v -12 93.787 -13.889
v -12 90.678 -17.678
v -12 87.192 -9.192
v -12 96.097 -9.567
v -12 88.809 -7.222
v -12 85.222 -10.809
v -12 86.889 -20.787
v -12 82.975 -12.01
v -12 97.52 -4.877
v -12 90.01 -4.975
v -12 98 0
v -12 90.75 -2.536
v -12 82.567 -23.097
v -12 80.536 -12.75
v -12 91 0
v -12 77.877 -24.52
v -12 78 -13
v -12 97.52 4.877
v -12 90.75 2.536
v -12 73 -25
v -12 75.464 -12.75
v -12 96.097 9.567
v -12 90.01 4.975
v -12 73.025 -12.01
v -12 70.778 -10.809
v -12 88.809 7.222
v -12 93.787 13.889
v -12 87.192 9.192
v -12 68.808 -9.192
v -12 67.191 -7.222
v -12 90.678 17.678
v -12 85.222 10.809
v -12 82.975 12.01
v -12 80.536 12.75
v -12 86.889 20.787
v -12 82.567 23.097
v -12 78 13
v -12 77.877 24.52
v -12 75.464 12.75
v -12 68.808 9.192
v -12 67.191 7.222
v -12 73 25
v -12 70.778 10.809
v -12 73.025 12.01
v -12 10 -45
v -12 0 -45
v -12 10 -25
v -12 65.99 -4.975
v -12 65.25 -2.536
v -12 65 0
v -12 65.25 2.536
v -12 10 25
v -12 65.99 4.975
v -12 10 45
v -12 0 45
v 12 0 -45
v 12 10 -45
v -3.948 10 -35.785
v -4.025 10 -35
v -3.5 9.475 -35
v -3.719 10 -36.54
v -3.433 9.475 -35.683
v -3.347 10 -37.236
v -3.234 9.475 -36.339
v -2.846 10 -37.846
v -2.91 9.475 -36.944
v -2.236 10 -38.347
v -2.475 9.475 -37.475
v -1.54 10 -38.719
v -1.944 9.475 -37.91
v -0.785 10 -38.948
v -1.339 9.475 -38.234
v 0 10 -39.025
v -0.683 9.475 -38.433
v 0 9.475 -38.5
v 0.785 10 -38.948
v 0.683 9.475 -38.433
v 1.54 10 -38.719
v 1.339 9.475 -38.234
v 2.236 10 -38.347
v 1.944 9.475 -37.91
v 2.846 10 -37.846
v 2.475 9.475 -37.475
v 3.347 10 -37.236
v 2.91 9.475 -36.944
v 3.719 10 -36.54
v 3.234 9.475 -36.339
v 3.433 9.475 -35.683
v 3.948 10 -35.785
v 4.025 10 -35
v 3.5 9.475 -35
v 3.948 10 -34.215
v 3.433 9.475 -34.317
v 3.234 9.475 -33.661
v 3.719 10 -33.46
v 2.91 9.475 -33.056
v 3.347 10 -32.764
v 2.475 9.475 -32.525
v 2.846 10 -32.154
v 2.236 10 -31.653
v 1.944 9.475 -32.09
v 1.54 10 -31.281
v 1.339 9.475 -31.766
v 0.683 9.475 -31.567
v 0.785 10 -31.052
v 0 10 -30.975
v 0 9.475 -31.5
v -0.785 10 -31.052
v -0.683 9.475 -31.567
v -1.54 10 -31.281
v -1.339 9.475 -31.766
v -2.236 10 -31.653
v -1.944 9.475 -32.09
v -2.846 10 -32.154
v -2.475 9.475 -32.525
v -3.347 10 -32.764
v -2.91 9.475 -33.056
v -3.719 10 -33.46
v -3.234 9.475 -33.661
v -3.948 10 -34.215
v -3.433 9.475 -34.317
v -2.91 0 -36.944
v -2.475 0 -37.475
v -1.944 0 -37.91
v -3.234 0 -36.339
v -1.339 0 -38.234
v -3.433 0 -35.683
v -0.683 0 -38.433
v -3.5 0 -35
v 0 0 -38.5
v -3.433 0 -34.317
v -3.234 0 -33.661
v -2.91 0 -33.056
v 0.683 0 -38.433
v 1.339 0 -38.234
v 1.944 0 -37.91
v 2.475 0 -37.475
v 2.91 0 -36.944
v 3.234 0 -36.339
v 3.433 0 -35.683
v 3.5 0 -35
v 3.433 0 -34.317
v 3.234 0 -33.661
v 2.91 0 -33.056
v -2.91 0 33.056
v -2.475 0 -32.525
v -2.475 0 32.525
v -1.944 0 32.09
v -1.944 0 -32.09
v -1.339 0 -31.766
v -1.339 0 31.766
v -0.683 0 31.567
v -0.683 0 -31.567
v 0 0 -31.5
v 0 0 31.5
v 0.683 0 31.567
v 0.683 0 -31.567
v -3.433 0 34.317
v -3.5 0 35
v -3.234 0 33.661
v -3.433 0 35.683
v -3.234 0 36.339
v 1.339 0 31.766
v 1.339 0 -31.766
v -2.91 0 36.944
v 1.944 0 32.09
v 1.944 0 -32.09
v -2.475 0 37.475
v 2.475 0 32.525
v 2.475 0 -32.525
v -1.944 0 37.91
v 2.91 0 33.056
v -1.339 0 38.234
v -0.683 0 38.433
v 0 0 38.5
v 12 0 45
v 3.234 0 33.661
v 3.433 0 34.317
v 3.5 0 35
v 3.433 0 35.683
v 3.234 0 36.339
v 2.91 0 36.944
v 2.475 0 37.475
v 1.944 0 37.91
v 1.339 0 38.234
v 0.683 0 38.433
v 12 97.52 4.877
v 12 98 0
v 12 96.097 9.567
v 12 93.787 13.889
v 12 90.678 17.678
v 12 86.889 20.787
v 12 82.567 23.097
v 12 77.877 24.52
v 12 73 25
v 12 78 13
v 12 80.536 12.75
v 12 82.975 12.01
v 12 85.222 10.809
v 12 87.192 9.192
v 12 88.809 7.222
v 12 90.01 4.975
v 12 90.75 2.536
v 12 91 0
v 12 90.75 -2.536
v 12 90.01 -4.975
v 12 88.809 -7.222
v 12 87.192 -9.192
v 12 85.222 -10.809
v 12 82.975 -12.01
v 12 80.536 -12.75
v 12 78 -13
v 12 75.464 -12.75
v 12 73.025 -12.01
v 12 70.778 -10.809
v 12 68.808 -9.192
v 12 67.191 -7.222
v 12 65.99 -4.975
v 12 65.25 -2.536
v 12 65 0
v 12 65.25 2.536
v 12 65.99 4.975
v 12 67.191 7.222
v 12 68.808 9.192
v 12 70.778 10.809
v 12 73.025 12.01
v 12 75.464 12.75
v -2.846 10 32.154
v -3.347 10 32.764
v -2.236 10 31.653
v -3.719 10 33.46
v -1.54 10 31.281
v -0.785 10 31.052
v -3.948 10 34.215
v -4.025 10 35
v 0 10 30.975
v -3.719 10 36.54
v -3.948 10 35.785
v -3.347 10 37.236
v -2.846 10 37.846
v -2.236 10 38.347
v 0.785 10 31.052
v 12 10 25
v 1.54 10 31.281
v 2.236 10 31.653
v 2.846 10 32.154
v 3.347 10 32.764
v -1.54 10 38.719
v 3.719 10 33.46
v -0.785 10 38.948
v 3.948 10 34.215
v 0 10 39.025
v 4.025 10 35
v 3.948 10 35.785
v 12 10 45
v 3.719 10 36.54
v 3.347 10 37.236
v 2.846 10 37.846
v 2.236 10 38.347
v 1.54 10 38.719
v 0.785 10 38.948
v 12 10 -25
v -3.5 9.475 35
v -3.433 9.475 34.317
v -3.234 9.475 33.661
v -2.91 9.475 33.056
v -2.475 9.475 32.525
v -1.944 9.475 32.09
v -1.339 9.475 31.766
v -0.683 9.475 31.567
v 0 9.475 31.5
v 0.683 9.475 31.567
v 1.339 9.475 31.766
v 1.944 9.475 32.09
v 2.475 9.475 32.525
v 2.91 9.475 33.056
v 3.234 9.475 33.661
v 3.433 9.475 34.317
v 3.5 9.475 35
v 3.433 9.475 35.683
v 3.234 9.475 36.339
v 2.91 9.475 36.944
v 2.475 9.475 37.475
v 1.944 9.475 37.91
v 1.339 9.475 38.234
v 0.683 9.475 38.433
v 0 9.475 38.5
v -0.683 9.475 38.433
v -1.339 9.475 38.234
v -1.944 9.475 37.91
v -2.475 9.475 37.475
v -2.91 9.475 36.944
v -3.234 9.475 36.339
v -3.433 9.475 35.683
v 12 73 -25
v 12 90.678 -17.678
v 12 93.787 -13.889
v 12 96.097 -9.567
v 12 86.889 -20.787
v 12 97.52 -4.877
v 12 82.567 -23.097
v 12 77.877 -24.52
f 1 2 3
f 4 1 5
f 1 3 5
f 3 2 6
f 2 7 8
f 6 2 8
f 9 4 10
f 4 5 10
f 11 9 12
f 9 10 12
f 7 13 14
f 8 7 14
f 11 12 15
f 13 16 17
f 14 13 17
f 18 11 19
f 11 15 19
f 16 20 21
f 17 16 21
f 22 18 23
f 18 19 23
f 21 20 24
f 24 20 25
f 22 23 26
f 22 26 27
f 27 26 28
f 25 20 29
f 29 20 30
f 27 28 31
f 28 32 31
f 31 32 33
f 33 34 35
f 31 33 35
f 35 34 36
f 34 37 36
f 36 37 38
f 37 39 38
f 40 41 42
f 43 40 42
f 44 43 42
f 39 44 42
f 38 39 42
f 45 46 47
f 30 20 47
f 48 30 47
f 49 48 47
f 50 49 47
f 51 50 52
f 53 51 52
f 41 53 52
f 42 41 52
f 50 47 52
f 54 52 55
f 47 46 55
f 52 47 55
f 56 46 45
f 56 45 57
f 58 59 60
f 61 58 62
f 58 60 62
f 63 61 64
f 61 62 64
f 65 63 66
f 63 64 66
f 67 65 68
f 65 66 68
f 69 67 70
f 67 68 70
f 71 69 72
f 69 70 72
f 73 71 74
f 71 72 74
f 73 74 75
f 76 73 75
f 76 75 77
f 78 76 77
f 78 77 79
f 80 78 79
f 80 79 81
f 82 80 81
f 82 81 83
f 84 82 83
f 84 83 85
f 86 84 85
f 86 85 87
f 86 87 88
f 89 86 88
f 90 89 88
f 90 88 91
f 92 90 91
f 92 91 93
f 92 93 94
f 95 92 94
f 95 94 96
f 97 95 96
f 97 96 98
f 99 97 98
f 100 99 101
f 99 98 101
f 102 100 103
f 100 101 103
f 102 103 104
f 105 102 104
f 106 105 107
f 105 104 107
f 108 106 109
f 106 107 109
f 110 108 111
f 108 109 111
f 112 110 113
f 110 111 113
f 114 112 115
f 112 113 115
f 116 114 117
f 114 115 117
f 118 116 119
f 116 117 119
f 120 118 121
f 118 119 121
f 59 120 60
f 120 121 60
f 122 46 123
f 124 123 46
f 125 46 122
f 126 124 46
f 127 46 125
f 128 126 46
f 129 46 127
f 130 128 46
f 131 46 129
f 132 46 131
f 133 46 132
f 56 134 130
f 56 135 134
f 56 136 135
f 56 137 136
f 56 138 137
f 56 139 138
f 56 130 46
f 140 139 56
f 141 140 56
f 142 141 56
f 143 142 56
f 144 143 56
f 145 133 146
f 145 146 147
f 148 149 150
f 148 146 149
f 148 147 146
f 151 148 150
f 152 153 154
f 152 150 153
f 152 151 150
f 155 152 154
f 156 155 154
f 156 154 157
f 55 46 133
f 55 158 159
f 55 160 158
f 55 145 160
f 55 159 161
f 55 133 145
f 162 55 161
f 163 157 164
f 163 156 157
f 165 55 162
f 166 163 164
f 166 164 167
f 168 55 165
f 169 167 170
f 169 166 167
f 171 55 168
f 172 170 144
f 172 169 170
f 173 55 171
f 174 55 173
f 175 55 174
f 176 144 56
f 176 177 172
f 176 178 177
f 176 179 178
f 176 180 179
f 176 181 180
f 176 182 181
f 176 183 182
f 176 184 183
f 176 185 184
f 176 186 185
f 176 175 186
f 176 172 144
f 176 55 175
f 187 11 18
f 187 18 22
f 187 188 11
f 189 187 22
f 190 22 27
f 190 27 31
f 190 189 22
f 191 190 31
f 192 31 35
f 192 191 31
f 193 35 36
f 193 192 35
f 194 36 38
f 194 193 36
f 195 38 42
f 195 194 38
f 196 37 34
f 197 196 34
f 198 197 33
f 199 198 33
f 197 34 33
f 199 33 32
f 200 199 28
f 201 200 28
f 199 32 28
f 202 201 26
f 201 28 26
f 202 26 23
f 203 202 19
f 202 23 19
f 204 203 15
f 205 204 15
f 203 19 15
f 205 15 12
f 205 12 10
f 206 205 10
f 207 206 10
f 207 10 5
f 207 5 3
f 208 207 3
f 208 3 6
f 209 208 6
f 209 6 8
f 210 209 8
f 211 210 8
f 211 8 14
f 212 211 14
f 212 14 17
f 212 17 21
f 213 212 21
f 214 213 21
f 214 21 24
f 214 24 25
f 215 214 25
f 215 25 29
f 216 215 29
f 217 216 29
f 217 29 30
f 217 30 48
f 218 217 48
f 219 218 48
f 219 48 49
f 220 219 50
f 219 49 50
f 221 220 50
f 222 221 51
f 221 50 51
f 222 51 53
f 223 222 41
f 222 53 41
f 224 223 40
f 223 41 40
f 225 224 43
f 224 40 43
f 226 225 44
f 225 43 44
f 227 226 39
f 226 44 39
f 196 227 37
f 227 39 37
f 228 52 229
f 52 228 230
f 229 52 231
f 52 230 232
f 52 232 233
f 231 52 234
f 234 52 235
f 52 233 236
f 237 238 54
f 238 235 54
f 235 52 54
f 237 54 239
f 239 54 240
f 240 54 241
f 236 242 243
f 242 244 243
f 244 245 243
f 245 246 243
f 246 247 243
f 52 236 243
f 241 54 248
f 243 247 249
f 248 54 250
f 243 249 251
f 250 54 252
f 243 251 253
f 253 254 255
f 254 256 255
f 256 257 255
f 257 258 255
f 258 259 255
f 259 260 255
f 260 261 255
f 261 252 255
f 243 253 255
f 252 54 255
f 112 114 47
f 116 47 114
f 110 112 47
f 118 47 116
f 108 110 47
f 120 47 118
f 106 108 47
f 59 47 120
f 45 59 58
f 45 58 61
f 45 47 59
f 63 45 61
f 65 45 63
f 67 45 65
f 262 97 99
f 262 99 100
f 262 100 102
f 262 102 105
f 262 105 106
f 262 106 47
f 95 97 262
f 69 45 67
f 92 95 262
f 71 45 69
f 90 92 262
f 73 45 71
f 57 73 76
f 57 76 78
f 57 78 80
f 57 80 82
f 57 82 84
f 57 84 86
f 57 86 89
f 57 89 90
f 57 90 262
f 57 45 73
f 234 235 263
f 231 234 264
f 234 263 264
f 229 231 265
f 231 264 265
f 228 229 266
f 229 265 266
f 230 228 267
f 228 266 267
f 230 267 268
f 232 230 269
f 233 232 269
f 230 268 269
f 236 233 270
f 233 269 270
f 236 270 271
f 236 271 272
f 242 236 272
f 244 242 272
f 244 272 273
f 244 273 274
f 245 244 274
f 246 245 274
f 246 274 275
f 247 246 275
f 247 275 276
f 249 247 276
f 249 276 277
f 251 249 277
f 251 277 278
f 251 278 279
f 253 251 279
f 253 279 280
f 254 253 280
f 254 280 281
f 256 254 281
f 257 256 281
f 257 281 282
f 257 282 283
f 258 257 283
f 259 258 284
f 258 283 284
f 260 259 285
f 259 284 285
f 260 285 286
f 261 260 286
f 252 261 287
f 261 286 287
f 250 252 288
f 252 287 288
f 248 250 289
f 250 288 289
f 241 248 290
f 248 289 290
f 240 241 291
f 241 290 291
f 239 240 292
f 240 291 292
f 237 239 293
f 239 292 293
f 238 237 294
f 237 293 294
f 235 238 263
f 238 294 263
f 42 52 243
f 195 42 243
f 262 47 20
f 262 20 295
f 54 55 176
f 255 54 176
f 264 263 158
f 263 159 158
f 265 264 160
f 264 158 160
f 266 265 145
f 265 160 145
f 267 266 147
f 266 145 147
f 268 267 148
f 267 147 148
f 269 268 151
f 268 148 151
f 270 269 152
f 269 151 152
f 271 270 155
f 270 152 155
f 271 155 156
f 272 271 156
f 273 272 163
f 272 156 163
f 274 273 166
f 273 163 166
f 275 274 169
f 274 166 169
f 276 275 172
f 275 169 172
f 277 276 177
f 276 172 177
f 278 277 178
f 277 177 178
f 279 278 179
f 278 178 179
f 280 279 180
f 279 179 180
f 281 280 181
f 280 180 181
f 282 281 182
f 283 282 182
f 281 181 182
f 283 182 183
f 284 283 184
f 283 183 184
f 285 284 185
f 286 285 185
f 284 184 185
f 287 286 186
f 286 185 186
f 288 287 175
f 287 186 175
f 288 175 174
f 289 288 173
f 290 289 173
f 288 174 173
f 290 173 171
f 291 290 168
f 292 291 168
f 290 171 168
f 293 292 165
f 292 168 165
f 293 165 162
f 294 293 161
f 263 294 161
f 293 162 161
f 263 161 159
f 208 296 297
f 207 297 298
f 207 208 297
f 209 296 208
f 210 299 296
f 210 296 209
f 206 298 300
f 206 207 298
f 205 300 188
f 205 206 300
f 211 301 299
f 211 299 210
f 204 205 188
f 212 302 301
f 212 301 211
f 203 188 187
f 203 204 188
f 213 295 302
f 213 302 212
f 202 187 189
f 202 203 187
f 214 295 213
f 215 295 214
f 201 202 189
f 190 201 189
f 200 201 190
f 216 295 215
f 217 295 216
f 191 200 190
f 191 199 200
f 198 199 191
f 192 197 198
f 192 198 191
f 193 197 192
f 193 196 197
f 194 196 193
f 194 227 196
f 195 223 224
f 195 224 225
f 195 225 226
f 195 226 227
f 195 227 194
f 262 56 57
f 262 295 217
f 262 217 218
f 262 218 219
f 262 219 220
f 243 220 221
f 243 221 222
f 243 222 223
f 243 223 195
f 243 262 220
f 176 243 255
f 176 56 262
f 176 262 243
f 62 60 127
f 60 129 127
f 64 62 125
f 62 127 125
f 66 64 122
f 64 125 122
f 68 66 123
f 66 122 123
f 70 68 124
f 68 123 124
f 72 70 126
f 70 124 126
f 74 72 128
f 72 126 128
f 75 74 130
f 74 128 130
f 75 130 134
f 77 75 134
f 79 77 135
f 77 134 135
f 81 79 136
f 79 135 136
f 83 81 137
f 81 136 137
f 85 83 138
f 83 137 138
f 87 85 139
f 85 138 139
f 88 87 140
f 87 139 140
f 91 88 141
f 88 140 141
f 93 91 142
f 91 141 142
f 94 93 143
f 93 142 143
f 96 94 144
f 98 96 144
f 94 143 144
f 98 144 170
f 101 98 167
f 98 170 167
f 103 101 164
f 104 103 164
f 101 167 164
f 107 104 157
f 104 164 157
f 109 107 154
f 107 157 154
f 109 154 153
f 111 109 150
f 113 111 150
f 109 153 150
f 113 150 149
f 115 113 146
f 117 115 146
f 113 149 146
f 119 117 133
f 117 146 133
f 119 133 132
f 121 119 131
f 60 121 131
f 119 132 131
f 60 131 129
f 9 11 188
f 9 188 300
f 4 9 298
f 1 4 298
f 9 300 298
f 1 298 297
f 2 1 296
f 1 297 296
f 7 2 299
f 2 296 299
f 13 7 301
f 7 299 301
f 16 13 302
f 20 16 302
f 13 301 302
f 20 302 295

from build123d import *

# Parameters (mm, degrees)
EXTRUDE_1_DEPTH      = 10
EXTRUDE_2_DEPTH      = 68
SKETCH_9_W           = 24
SKETCH_9_H           = 50
EXTRUDE_4_DEPTH      = 20
SKETCH_10_R          = 13
CUT_EXTRUDE_3_DEPTH  = 109.53570841
FILLET_6_R           = 25
SKETCH_22_W          = 24
SKETCH_22_H          = 5
EXTRUDE_5_DEPTH      = 10
M8X1_0_1_D           = 7
M8X1_0_1_CSINK_D     = 8.05
M8X1_0_1_CSINK_ANGLE = 90


with BuildPart() as part:
    # 草图1 → 凸台-拉伸1 (new body)
    with BuildSketch(Plane(origin=(0, 0, 0), x_dir=(1, 0, 0), z_dir=(0, 1, 0))):
        Polygon((12, 37.5), (12, 40), (-12, 40), (-12, 37.5), (-12, -37.5), (-12, -40), (12, -40), (12, -37.5), align=None)
    extrude(amount=EXTRUDE_1_DEPTH)

    # 草图2 → 凸台-拉伸2 (add)
    with BuildSketch(Plane(origin=(0, 10, 0), x_dir=(1, 0, 0), z_dir=(0, 1, 0))):
        Polygon((-4, 25), (-12, 25), (-12, -25), (-4, -25), (4, -25), (12, -25), (12, 25), (4, 25), align=None)
    extrude(amount=EXTRUDE_2_DEPTH)

    # 草图9 → 凸台-拉伸4 (add)
    with BuildSketch(Plane(origin=(0, 78, 0), x_dir=(1, 0, 0), z_dir=(0, 1, 0))):
        Rectangle(SKETCH_9_W, SKETCH_9_H)
    extrude(amount=EXTRUDE_4_DEPTH)

    # 草图10 → 切除-拉伸3 (cut, through all)
    with BuildSketch(Plane.ZY.offset(12)):
        with Locations((0, 78)):
            Circle(SKETCH_10_R)
    extrude(amount=-CUT_EXTRUDE_3_DEPTH, mode=Mode.SUBTRACT)

    # 圆角6
    fillet_6_edges = [part.edges().sort_by_distance(p)[0] for p in [
        (0, 98, -25),
        (0, 98, 25),
    ]]
    fillet(fillet_6_edges, radius=FILLET_6_R - 0.0001)  # a hair under: the kernel refuses the full size

    # 草图22 → 凸台-拉伸5 (add)
    with BuildSketch(Plane.XZ):
        with Locations((0, 42.5)):
            Rectangle(SKETCH_22_W, SKETCH_22_H)
        with Locations((0, -42.5)):
            Rectangle(SKETCH_22_W, SKETCH_22_H)
    extrude(amount=-EXTRUDE_5_DEPTH)

    # M8x1.0 螺纹孔1 (through all)
    with Locations(Plane(origin=(0, 10, 0), x_dir=(1, 0, 0), z_dir=(0, 1, 0))):
        with Locations((0, -35), (0, 35)):
            CounterSinkHole(M8X1_0_1_D / 2, M8X1_0_1_CSINK_D / 2, counter_sink_angle=M8X1_0_1_CSINK_ANGLE)


solid = part.part
